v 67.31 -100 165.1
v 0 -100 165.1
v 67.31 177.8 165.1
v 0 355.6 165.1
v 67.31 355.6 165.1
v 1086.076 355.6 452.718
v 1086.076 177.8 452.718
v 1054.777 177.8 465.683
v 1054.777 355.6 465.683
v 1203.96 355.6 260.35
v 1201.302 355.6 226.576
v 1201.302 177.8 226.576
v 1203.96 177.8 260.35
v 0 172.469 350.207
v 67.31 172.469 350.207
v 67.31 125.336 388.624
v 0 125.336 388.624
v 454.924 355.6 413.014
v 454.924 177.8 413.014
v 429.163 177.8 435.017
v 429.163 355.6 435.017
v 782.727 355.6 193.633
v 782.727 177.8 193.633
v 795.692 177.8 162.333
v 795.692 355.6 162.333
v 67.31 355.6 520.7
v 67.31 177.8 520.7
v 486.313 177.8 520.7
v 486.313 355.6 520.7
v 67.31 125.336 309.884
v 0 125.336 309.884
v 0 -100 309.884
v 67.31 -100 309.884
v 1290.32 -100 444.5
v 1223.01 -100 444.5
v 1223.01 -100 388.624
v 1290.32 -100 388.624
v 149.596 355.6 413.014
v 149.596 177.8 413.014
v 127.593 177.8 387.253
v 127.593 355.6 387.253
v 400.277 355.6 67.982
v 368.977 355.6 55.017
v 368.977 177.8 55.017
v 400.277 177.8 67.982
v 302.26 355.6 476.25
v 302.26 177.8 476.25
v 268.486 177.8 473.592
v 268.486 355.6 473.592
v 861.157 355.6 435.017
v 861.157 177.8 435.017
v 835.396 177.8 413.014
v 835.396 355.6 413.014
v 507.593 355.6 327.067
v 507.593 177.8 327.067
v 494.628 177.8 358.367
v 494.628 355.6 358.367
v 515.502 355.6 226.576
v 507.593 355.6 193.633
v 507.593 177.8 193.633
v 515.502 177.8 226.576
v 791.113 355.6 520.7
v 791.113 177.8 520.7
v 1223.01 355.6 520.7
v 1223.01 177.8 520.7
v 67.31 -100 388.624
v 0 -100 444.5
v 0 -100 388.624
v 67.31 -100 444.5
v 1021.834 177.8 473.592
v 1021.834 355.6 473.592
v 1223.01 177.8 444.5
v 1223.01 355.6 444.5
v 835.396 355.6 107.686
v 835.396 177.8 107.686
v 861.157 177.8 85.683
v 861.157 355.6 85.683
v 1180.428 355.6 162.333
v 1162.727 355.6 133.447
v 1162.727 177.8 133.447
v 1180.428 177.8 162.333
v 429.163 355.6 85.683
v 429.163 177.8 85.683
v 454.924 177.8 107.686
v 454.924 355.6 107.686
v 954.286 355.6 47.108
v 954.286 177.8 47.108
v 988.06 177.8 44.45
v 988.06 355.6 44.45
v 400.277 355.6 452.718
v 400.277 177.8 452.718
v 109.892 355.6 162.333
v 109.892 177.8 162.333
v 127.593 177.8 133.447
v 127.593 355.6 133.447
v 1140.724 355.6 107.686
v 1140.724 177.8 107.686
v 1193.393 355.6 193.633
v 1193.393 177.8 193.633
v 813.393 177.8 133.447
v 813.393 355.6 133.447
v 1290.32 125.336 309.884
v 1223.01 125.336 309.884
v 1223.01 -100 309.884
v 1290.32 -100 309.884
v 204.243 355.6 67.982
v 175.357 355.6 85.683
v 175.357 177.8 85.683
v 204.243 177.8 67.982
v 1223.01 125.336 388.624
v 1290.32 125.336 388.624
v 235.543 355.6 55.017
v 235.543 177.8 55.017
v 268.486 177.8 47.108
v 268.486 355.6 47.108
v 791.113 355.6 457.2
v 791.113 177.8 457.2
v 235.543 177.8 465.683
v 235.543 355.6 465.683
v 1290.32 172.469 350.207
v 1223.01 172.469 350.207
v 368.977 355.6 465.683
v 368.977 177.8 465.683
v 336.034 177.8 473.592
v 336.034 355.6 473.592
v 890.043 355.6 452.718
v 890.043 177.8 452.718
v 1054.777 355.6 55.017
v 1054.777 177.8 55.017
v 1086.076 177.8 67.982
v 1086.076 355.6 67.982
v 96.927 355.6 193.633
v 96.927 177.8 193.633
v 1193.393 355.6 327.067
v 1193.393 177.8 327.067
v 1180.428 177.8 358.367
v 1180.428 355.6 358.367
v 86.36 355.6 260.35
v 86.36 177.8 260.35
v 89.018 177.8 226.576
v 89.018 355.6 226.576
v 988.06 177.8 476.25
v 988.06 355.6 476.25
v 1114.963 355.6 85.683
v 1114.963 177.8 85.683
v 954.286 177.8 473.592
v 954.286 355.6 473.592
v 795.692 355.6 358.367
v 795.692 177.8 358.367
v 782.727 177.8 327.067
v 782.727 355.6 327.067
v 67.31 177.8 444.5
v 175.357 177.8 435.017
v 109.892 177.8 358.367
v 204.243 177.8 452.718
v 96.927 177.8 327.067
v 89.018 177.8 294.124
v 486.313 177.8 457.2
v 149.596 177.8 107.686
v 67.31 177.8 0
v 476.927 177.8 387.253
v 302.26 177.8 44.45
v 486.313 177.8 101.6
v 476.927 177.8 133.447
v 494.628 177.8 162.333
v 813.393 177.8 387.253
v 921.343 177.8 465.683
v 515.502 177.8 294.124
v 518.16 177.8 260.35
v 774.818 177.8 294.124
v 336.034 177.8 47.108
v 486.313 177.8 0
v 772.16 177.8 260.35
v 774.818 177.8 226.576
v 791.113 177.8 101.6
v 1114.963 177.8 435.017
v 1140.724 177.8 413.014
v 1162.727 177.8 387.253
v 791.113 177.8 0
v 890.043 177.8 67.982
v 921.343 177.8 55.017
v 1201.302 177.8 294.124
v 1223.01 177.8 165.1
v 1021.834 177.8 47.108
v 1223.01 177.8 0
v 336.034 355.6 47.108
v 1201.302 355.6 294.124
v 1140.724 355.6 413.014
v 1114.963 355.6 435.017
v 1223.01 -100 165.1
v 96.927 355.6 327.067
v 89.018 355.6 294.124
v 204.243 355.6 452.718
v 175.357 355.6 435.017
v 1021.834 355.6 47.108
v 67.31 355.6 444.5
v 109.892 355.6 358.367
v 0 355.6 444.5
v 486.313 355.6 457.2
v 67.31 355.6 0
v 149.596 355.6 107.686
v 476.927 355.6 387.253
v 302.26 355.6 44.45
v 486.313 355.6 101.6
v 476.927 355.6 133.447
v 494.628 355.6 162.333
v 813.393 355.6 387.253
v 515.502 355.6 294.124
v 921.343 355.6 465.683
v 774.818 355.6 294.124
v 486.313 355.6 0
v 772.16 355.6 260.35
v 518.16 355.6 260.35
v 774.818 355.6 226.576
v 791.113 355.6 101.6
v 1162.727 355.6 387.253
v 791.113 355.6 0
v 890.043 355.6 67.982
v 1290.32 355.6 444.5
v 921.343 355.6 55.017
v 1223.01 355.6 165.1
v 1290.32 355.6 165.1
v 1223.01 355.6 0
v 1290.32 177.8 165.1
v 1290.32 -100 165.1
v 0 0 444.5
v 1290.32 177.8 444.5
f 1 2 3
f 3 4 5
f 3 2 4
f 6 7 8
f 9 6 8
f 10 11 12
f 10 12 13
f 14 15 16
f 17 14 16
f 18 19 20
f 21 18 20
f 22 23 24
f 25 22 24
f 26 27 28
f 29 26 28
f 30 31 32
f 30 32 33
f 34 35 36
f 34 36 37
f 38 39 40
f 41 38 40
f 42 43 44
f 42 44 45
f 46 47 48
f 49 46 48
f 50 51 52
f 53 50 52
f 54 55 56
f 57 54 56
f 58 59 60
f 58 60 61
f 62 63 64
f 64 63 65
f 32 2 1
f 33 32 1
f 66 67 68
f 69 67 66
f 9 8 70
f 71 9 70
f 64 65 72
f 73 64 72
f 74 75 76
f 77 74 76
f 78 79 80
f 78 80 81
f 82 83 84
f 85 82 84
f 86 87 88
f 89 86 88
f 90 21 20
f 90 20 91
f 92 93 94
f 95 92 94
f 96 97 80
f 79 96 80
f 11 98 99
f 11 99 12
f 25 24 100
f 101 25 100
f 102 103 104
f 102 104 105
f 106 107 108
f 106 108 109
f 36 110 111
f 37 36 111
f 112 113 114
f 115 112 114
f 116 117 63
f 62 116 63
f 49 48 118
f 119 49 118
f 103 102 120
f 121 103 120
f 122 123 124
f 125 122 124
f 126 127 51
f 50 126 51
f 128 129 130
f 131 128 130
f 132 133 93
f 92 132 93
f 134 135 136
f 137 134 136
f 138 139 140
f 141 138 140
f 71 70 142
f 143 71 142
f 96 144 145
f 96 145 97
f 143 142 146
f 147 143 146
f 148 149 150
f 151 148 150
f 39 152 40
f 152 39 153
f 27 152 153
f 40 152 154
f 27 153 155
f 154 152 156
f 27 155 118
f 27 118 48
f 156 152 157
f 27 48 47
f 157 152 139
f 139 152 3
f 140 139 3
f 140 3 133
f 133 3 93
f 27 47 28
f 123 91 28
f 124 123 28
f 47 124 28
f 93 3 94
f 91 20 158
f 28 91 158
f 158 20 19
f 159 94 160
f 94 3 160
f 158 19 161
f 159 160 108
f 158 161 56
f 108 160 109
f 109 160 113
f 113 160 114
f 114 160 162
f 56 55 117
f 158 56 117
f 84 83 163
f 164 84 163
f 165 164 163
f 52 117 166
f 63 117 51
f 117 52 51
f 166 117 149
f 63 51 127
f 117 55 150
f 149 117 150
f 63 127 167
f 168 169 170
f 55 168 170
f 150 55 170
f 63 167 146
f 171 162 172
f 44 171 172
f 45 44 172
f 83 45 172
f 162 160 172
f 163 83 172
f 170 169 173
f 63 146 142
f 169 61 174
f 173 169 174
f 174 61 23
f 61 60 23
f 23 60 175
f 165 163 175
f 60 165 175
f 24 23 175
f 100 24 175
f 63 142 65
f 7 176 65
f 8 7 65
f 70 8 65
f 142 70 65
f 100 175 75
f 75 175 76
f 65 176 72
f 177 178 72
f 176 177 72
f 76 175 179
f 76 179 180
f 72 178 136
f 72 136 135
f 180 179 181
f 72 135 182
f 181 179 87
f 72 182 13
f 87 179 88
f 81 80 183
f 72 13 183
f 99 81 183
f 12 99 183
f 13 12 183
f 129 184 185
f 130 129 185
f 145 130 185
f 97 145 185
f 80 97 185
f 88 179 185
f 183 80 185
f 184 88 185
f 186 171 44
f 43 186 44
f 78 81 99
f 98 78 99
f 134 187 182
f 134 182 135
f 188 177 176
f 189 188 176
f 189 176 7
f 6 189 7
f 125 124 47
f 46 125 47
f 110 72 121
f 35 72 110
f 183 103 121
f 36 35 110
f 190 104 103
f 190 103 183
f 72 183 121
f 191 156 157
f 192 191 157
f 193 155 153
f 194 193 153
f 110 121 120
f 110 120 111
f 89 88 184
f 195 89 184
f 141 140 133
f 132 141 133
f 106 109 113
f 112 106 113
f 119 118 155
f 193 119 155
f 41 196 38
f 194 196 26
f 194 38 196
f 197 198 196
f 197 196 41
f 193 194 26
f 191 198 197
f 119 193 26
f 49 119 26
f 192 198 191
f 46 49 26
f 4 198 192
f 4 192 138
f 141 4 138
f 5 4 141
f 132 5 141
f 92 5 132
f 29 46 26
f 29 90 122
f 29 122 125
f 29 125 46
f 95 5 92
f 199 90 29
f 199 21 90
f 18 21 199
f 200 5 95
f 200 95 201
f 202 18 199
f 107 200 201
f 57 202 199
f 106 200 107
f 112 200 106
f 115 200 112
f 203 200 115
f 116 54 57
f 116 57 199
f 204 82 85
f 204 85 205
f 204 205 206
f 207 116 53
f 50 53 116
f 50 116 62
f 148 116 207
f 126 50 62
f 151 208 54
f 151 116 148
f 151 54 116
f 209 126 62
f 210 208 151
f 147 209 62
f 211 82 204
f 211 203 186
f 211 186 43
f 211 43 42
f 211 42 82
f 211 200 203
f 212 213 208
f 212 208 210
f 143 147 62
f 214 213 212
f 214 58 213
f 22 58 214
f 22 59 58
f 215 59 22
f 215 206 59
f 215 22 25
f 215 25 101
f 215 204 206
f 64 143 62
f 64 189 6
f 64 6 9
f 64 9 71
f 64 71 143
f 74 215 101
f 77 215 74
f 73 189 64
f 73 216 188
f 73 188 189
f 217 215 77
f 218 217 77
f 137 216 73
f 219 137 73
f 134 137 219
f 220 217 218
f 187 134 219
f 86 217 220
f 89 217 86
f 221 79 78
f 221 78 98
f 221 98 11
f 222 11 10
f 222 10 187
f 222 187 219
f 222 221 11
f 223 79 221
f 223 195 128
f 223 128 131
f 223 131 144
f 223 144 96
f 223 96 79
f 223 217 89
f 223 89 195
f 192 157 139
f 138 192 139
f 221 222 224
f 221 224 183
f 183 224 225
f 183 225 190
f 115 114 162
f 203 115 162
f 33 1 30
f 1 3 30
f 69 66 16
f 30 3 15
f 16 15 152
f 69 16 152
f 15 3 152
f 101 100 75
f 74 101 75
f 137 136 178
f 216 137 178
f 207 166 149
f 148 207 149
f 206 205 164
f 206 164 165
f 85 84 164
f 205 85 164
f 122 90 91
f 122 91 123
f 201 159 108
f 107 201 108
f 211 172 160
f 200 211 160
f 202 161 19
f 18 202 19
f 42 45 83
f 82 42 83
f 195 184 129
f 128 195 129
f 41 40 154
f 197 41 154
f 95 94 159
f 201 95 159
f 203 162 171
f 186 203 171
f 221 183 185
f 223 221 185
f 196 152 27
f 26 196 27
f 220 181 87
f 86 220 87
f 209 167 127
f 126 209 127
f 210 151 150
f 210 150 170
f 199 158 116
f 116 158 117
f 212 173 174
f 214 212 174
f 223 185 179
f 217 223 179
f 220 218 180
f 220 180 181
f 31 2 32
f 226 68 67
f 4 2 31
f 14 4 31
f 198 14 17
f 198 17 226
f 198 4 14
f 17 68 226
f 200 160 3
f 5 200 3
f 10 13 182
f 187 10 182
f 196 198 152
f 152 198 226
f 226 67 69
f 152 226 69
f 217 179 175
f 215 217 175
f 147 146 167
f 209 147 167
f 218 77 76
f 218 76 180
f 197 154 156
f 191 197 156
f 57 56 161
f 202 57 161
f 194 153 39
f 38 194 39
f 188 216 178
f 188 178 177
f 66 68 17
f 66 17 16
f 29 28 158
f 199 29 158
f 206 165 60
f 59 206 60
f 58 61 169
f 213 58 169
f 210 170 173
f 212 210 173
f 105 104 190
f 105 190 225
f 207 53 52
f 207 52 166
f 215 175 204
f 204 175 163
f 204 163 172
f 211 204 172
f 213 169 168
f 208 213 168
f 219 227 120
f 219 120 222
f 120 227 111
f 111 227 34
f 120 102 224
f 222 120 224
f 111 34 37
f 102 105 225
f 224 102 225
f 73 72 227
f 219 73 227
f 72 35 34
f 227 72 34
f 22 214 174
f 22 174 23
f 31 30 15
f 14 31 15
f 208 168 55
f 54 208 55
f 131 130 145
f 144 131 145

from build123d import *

# Parameters (mm, degrees)
CONVERTED1_START         = 177.799999714
CONVERTED1_DEPTH         = 177.799999714
CONVERTED1_2_OUTLINE_W   = 67.310094833
CONVERTED1_2_OUTLINE_H   = 144.784152508
CONVERTED1_2_OUTLINE_H_2 = 55.875837803
CONVERTED1_2_OUTLINE_W_2 = 67.310005426
CONVERTED1_2_DEPTH       = 177.799999714
CONVERTED1_START_2       = 125.335559249
CONVERTED1_3_OUTLINE_W   = 67.310094833
CONVERTED1_3_OUTLINE_H   = 78.740000725
CONVERTED1_3_OUTLINE_W_2 = 67.310005426
CONVERTED1_3_DEPTH       = 52.464440465
CONVERTED1_START_3       = -1
CONVERTED1_4_DEPTH       = 1292
SKETCH1_W                = 67.310005426
SKETCH1_H                = 144.784152508
SKETCH1_H_2              = 55.875837803
SKETCH1_W_2              = 67.310094833
BOSS_EXTRUDE1_DEPTH      = 100


with BuildPart() as part:
    # Converted1: read off the stored shape, not the designer's step
    # Converted1 outline → Converted1 (new body)
    with BuildSketch(Plane(origin=(0, 0, 0), x_dir=(1, 0, 0), z_dir=(0, 1, 0)).offset(CONVERTED1_START)):
        Polygon((1223.009943962, -165.100008249), (1223.009943962, 0), (791.113138199, 0), (791.113138199, -101.599998772), (486.313134432, -101.599998772), (486.313134432, 0), (67.310005426, 0), (67.310005426, -165.100008249), (0, -165.100008249), (0, -444.499999285), (67.310005426, -444.499999285), (67.310005426, -520.699977875), (486.313134432, -520.699977875), (486.313134432, -457.199990749), (791.113138199, -457.199990749), (791.113138199, -520.699977875), (1223.009943962, -520.699977875), (1223.009943962, -444.499999285), (1290.320038795, -444.499999285), (1290.320038795, -165.100008249), align=None)
        Polygon((515.501916409, -226.575806737), (518.159985542, -260.349988937), (515.501916409, -294.124186039), (507.593095303, -327.066779137), (494.628280401, -358.366549015), (476.926743984, -387.25283742), (454.924374819, -413.014382124), (429.162800312, -435.016751289), (400.27654171, -452.718287706), (368.976742029, -465.683102608), (336.034178734, -473.591923714), (302.259981632, -476.249992847), (268.485784531, -473.591923714), (235.543236136, -465.683102608), (204.243451357, -452.718287706), (175.357162952, -435.016751289), (149.59564805, -413.014382124), (127.593204379, -387.25283742), (109.891682863, -358.366549015), (96.926905215, -327.066779137), (89.018076658, -294.124186039), (86.360000074, -260.349988937), (89.018076658, -226.575806737), (96.926905215, -193.633243442), (109.891682863, -162.333458662), (127.593204379, -133.447170258), (149.59564805, -107.685647905), (175.357162952, -85.683234036), (204.243451357, -67.98170507), (235.543236136, -55.016901344), (268.485784531, -47.108106315), (302.259981632, -44.449992478), (336.034178734, -47.108106315), (368.976742029, -55.016901344), (400.27654171, -67.98170507), (429.162800312, -85.683234036), (454.924374819, -107.685647905), (476.926743984, -133.447170258), (494.628280401, -162.333458662), (507.593095303, -193.633243442), align=None, mode=Mode.SUBTRACT)
        Polygon((1054.776668549, -55.016901344), (1086.076498032, -67.98170507), (1114.962816238, -85.683234036), (1140.724420547, -107.685647905), (1162.726759911, -133.447170258), (1180.428385735, -162.333458662), (1193.39299202, -193.633243442), (1201.301813126, -226.575806737), (1203.959941864, -260.349988937), (1201.301813126, -294.124186039), (1193.39299202, -327.066779137), (1180.428385735, -358.366549015), (1162.726759911, -387.25283742), (1140.724420547, -413.014382124), (1114.962816238, -435.016751289), (1086.076498032, -452.718287706), (1054.776668549, -465.683102608), (1021.834254265, -473.591923714), (988.060057163, -476.249992847), (954.285860062, -473.591923714), (921.343266964, -465.683102608), (890.043437481, -452.718287706), (861.157119274, -435.016751289), (835.395634174, -413.014382124), (813.393175602, -387.25283742), (795.691668987, -358.366549015), (782.726883888, -327.066779137), (774.818062782, -294.124186039), (772.159993649, -260.349988937), (774.818062782, -226.575806737), (782.726883888, -193.633243442), (795.691668987, -162.333458662), (813.393175602, -133.447170258), (835.395634174, -107.685647905), (861.157119274, -85.683234036), (890.043437481, -67.98170507), (921.343266964, -55.016901344), (954.285860062, -47.108106315), (988.060057163, -44.449992478), (1021.834254265, -47.108106315), align=None, mode=Mode.SUBTRACT)
    extrude(amount=CONVERTED1_DEPTH)



with BuildPart() as body_2:
    # Converted1 2 outline → Converted1 2 (new body)
    with BuildSketch(Plane(origin=(0, 0, 0), x_dir=(1, 0, 0), z_dir=(0, 1, 0))):
        with Locations((1256.664991378, -237.492084503)):
            Rectangle(CONVERTED1_2_OUTLINE_W, CONVERTED1_2_OUTLINE_H)
        with Locations((1256.664991378, -416.562080384)):
            Rectangle(CONVERTED1_2_OUTLINE_W, CONVERTED1_2_OUTLINE_H_2)
        with Locations((33.655002713, -237.492084503)):
            Rectangle(CONVERTED1_2_OUTLINE_W_2, CONVERTED1_2_OUTLINE_H)
        with Locations((33.655002713, -416.562080384)):
            Rectangle(CONVERTED1_2_OUTLINE_W_2, CONVERTED1_2_OUTLINE_H_2)
    extrude(amount=CONVERTED1_2_DEPTH)


with BuildPart() as part_1:
    add(part.part)

    add(body_2.part)  # Converted1 3 merges body 2
    # Converted1 3 outline → Converted1 3 (add)
    with BuildSketch(Plane(origin=(0, 0, 0), x_dir=(1, 0, 0), z_dir=(0, 1, 0)).offset(CONVERTED1_START_2)):
        with Locations((1256.664991378, -349.25416112)):
            Rectangle(CONVERTED1_3_OUTLINE_W, CONVERTED1_3_OUTLINE_H)
        with Locations((33.655002713, -349.25416112)):
            Rectangle(CONVERTED1_3_OUTLINE_W_2, CONVERTED1_3_OUTLINE_H)
    extrude(amount=CONVERTED1_3_DEPTH)

    # Converted1 4 outline → Converted1 4 (cut)
    with BuildSketch(Plane.YZ.offset(CONVERTED1_START_3)):
        Polygon((125.335559249, 388.624161482), (125.335559249, 309.884160757), (172.469392419, 350.206673145), align=None)
    extrude(amount=CONVERTED1_4_DEPTH, mode=Mode.SUBTRACT)

    # Sketch1 → Boss-Extrude1 (add)
    with BuildSketch(Plane.XZ):
        with Locations((33.655002713, 237.492084503)):
            Rectangle(SKETCH1_W, SKETCH1_H)
        with Locations((33.655002713, 416.562080384)):
            Rectangle(SKETCH1_W, SKETCH1_H_2)
        with Locations((1256.664991378, 416.562080384)):
            Rectangle(SKETCH1_W_2, SKETCH1_H_2)
        with Locations((1256.664991378, 237.492084503)):
            Rectangle(SKETCH1_W_2, SKETCH1_H)
    extrude(amount=BOSS_EXTRUDE1_DEPTH)


solid = part_1.part
